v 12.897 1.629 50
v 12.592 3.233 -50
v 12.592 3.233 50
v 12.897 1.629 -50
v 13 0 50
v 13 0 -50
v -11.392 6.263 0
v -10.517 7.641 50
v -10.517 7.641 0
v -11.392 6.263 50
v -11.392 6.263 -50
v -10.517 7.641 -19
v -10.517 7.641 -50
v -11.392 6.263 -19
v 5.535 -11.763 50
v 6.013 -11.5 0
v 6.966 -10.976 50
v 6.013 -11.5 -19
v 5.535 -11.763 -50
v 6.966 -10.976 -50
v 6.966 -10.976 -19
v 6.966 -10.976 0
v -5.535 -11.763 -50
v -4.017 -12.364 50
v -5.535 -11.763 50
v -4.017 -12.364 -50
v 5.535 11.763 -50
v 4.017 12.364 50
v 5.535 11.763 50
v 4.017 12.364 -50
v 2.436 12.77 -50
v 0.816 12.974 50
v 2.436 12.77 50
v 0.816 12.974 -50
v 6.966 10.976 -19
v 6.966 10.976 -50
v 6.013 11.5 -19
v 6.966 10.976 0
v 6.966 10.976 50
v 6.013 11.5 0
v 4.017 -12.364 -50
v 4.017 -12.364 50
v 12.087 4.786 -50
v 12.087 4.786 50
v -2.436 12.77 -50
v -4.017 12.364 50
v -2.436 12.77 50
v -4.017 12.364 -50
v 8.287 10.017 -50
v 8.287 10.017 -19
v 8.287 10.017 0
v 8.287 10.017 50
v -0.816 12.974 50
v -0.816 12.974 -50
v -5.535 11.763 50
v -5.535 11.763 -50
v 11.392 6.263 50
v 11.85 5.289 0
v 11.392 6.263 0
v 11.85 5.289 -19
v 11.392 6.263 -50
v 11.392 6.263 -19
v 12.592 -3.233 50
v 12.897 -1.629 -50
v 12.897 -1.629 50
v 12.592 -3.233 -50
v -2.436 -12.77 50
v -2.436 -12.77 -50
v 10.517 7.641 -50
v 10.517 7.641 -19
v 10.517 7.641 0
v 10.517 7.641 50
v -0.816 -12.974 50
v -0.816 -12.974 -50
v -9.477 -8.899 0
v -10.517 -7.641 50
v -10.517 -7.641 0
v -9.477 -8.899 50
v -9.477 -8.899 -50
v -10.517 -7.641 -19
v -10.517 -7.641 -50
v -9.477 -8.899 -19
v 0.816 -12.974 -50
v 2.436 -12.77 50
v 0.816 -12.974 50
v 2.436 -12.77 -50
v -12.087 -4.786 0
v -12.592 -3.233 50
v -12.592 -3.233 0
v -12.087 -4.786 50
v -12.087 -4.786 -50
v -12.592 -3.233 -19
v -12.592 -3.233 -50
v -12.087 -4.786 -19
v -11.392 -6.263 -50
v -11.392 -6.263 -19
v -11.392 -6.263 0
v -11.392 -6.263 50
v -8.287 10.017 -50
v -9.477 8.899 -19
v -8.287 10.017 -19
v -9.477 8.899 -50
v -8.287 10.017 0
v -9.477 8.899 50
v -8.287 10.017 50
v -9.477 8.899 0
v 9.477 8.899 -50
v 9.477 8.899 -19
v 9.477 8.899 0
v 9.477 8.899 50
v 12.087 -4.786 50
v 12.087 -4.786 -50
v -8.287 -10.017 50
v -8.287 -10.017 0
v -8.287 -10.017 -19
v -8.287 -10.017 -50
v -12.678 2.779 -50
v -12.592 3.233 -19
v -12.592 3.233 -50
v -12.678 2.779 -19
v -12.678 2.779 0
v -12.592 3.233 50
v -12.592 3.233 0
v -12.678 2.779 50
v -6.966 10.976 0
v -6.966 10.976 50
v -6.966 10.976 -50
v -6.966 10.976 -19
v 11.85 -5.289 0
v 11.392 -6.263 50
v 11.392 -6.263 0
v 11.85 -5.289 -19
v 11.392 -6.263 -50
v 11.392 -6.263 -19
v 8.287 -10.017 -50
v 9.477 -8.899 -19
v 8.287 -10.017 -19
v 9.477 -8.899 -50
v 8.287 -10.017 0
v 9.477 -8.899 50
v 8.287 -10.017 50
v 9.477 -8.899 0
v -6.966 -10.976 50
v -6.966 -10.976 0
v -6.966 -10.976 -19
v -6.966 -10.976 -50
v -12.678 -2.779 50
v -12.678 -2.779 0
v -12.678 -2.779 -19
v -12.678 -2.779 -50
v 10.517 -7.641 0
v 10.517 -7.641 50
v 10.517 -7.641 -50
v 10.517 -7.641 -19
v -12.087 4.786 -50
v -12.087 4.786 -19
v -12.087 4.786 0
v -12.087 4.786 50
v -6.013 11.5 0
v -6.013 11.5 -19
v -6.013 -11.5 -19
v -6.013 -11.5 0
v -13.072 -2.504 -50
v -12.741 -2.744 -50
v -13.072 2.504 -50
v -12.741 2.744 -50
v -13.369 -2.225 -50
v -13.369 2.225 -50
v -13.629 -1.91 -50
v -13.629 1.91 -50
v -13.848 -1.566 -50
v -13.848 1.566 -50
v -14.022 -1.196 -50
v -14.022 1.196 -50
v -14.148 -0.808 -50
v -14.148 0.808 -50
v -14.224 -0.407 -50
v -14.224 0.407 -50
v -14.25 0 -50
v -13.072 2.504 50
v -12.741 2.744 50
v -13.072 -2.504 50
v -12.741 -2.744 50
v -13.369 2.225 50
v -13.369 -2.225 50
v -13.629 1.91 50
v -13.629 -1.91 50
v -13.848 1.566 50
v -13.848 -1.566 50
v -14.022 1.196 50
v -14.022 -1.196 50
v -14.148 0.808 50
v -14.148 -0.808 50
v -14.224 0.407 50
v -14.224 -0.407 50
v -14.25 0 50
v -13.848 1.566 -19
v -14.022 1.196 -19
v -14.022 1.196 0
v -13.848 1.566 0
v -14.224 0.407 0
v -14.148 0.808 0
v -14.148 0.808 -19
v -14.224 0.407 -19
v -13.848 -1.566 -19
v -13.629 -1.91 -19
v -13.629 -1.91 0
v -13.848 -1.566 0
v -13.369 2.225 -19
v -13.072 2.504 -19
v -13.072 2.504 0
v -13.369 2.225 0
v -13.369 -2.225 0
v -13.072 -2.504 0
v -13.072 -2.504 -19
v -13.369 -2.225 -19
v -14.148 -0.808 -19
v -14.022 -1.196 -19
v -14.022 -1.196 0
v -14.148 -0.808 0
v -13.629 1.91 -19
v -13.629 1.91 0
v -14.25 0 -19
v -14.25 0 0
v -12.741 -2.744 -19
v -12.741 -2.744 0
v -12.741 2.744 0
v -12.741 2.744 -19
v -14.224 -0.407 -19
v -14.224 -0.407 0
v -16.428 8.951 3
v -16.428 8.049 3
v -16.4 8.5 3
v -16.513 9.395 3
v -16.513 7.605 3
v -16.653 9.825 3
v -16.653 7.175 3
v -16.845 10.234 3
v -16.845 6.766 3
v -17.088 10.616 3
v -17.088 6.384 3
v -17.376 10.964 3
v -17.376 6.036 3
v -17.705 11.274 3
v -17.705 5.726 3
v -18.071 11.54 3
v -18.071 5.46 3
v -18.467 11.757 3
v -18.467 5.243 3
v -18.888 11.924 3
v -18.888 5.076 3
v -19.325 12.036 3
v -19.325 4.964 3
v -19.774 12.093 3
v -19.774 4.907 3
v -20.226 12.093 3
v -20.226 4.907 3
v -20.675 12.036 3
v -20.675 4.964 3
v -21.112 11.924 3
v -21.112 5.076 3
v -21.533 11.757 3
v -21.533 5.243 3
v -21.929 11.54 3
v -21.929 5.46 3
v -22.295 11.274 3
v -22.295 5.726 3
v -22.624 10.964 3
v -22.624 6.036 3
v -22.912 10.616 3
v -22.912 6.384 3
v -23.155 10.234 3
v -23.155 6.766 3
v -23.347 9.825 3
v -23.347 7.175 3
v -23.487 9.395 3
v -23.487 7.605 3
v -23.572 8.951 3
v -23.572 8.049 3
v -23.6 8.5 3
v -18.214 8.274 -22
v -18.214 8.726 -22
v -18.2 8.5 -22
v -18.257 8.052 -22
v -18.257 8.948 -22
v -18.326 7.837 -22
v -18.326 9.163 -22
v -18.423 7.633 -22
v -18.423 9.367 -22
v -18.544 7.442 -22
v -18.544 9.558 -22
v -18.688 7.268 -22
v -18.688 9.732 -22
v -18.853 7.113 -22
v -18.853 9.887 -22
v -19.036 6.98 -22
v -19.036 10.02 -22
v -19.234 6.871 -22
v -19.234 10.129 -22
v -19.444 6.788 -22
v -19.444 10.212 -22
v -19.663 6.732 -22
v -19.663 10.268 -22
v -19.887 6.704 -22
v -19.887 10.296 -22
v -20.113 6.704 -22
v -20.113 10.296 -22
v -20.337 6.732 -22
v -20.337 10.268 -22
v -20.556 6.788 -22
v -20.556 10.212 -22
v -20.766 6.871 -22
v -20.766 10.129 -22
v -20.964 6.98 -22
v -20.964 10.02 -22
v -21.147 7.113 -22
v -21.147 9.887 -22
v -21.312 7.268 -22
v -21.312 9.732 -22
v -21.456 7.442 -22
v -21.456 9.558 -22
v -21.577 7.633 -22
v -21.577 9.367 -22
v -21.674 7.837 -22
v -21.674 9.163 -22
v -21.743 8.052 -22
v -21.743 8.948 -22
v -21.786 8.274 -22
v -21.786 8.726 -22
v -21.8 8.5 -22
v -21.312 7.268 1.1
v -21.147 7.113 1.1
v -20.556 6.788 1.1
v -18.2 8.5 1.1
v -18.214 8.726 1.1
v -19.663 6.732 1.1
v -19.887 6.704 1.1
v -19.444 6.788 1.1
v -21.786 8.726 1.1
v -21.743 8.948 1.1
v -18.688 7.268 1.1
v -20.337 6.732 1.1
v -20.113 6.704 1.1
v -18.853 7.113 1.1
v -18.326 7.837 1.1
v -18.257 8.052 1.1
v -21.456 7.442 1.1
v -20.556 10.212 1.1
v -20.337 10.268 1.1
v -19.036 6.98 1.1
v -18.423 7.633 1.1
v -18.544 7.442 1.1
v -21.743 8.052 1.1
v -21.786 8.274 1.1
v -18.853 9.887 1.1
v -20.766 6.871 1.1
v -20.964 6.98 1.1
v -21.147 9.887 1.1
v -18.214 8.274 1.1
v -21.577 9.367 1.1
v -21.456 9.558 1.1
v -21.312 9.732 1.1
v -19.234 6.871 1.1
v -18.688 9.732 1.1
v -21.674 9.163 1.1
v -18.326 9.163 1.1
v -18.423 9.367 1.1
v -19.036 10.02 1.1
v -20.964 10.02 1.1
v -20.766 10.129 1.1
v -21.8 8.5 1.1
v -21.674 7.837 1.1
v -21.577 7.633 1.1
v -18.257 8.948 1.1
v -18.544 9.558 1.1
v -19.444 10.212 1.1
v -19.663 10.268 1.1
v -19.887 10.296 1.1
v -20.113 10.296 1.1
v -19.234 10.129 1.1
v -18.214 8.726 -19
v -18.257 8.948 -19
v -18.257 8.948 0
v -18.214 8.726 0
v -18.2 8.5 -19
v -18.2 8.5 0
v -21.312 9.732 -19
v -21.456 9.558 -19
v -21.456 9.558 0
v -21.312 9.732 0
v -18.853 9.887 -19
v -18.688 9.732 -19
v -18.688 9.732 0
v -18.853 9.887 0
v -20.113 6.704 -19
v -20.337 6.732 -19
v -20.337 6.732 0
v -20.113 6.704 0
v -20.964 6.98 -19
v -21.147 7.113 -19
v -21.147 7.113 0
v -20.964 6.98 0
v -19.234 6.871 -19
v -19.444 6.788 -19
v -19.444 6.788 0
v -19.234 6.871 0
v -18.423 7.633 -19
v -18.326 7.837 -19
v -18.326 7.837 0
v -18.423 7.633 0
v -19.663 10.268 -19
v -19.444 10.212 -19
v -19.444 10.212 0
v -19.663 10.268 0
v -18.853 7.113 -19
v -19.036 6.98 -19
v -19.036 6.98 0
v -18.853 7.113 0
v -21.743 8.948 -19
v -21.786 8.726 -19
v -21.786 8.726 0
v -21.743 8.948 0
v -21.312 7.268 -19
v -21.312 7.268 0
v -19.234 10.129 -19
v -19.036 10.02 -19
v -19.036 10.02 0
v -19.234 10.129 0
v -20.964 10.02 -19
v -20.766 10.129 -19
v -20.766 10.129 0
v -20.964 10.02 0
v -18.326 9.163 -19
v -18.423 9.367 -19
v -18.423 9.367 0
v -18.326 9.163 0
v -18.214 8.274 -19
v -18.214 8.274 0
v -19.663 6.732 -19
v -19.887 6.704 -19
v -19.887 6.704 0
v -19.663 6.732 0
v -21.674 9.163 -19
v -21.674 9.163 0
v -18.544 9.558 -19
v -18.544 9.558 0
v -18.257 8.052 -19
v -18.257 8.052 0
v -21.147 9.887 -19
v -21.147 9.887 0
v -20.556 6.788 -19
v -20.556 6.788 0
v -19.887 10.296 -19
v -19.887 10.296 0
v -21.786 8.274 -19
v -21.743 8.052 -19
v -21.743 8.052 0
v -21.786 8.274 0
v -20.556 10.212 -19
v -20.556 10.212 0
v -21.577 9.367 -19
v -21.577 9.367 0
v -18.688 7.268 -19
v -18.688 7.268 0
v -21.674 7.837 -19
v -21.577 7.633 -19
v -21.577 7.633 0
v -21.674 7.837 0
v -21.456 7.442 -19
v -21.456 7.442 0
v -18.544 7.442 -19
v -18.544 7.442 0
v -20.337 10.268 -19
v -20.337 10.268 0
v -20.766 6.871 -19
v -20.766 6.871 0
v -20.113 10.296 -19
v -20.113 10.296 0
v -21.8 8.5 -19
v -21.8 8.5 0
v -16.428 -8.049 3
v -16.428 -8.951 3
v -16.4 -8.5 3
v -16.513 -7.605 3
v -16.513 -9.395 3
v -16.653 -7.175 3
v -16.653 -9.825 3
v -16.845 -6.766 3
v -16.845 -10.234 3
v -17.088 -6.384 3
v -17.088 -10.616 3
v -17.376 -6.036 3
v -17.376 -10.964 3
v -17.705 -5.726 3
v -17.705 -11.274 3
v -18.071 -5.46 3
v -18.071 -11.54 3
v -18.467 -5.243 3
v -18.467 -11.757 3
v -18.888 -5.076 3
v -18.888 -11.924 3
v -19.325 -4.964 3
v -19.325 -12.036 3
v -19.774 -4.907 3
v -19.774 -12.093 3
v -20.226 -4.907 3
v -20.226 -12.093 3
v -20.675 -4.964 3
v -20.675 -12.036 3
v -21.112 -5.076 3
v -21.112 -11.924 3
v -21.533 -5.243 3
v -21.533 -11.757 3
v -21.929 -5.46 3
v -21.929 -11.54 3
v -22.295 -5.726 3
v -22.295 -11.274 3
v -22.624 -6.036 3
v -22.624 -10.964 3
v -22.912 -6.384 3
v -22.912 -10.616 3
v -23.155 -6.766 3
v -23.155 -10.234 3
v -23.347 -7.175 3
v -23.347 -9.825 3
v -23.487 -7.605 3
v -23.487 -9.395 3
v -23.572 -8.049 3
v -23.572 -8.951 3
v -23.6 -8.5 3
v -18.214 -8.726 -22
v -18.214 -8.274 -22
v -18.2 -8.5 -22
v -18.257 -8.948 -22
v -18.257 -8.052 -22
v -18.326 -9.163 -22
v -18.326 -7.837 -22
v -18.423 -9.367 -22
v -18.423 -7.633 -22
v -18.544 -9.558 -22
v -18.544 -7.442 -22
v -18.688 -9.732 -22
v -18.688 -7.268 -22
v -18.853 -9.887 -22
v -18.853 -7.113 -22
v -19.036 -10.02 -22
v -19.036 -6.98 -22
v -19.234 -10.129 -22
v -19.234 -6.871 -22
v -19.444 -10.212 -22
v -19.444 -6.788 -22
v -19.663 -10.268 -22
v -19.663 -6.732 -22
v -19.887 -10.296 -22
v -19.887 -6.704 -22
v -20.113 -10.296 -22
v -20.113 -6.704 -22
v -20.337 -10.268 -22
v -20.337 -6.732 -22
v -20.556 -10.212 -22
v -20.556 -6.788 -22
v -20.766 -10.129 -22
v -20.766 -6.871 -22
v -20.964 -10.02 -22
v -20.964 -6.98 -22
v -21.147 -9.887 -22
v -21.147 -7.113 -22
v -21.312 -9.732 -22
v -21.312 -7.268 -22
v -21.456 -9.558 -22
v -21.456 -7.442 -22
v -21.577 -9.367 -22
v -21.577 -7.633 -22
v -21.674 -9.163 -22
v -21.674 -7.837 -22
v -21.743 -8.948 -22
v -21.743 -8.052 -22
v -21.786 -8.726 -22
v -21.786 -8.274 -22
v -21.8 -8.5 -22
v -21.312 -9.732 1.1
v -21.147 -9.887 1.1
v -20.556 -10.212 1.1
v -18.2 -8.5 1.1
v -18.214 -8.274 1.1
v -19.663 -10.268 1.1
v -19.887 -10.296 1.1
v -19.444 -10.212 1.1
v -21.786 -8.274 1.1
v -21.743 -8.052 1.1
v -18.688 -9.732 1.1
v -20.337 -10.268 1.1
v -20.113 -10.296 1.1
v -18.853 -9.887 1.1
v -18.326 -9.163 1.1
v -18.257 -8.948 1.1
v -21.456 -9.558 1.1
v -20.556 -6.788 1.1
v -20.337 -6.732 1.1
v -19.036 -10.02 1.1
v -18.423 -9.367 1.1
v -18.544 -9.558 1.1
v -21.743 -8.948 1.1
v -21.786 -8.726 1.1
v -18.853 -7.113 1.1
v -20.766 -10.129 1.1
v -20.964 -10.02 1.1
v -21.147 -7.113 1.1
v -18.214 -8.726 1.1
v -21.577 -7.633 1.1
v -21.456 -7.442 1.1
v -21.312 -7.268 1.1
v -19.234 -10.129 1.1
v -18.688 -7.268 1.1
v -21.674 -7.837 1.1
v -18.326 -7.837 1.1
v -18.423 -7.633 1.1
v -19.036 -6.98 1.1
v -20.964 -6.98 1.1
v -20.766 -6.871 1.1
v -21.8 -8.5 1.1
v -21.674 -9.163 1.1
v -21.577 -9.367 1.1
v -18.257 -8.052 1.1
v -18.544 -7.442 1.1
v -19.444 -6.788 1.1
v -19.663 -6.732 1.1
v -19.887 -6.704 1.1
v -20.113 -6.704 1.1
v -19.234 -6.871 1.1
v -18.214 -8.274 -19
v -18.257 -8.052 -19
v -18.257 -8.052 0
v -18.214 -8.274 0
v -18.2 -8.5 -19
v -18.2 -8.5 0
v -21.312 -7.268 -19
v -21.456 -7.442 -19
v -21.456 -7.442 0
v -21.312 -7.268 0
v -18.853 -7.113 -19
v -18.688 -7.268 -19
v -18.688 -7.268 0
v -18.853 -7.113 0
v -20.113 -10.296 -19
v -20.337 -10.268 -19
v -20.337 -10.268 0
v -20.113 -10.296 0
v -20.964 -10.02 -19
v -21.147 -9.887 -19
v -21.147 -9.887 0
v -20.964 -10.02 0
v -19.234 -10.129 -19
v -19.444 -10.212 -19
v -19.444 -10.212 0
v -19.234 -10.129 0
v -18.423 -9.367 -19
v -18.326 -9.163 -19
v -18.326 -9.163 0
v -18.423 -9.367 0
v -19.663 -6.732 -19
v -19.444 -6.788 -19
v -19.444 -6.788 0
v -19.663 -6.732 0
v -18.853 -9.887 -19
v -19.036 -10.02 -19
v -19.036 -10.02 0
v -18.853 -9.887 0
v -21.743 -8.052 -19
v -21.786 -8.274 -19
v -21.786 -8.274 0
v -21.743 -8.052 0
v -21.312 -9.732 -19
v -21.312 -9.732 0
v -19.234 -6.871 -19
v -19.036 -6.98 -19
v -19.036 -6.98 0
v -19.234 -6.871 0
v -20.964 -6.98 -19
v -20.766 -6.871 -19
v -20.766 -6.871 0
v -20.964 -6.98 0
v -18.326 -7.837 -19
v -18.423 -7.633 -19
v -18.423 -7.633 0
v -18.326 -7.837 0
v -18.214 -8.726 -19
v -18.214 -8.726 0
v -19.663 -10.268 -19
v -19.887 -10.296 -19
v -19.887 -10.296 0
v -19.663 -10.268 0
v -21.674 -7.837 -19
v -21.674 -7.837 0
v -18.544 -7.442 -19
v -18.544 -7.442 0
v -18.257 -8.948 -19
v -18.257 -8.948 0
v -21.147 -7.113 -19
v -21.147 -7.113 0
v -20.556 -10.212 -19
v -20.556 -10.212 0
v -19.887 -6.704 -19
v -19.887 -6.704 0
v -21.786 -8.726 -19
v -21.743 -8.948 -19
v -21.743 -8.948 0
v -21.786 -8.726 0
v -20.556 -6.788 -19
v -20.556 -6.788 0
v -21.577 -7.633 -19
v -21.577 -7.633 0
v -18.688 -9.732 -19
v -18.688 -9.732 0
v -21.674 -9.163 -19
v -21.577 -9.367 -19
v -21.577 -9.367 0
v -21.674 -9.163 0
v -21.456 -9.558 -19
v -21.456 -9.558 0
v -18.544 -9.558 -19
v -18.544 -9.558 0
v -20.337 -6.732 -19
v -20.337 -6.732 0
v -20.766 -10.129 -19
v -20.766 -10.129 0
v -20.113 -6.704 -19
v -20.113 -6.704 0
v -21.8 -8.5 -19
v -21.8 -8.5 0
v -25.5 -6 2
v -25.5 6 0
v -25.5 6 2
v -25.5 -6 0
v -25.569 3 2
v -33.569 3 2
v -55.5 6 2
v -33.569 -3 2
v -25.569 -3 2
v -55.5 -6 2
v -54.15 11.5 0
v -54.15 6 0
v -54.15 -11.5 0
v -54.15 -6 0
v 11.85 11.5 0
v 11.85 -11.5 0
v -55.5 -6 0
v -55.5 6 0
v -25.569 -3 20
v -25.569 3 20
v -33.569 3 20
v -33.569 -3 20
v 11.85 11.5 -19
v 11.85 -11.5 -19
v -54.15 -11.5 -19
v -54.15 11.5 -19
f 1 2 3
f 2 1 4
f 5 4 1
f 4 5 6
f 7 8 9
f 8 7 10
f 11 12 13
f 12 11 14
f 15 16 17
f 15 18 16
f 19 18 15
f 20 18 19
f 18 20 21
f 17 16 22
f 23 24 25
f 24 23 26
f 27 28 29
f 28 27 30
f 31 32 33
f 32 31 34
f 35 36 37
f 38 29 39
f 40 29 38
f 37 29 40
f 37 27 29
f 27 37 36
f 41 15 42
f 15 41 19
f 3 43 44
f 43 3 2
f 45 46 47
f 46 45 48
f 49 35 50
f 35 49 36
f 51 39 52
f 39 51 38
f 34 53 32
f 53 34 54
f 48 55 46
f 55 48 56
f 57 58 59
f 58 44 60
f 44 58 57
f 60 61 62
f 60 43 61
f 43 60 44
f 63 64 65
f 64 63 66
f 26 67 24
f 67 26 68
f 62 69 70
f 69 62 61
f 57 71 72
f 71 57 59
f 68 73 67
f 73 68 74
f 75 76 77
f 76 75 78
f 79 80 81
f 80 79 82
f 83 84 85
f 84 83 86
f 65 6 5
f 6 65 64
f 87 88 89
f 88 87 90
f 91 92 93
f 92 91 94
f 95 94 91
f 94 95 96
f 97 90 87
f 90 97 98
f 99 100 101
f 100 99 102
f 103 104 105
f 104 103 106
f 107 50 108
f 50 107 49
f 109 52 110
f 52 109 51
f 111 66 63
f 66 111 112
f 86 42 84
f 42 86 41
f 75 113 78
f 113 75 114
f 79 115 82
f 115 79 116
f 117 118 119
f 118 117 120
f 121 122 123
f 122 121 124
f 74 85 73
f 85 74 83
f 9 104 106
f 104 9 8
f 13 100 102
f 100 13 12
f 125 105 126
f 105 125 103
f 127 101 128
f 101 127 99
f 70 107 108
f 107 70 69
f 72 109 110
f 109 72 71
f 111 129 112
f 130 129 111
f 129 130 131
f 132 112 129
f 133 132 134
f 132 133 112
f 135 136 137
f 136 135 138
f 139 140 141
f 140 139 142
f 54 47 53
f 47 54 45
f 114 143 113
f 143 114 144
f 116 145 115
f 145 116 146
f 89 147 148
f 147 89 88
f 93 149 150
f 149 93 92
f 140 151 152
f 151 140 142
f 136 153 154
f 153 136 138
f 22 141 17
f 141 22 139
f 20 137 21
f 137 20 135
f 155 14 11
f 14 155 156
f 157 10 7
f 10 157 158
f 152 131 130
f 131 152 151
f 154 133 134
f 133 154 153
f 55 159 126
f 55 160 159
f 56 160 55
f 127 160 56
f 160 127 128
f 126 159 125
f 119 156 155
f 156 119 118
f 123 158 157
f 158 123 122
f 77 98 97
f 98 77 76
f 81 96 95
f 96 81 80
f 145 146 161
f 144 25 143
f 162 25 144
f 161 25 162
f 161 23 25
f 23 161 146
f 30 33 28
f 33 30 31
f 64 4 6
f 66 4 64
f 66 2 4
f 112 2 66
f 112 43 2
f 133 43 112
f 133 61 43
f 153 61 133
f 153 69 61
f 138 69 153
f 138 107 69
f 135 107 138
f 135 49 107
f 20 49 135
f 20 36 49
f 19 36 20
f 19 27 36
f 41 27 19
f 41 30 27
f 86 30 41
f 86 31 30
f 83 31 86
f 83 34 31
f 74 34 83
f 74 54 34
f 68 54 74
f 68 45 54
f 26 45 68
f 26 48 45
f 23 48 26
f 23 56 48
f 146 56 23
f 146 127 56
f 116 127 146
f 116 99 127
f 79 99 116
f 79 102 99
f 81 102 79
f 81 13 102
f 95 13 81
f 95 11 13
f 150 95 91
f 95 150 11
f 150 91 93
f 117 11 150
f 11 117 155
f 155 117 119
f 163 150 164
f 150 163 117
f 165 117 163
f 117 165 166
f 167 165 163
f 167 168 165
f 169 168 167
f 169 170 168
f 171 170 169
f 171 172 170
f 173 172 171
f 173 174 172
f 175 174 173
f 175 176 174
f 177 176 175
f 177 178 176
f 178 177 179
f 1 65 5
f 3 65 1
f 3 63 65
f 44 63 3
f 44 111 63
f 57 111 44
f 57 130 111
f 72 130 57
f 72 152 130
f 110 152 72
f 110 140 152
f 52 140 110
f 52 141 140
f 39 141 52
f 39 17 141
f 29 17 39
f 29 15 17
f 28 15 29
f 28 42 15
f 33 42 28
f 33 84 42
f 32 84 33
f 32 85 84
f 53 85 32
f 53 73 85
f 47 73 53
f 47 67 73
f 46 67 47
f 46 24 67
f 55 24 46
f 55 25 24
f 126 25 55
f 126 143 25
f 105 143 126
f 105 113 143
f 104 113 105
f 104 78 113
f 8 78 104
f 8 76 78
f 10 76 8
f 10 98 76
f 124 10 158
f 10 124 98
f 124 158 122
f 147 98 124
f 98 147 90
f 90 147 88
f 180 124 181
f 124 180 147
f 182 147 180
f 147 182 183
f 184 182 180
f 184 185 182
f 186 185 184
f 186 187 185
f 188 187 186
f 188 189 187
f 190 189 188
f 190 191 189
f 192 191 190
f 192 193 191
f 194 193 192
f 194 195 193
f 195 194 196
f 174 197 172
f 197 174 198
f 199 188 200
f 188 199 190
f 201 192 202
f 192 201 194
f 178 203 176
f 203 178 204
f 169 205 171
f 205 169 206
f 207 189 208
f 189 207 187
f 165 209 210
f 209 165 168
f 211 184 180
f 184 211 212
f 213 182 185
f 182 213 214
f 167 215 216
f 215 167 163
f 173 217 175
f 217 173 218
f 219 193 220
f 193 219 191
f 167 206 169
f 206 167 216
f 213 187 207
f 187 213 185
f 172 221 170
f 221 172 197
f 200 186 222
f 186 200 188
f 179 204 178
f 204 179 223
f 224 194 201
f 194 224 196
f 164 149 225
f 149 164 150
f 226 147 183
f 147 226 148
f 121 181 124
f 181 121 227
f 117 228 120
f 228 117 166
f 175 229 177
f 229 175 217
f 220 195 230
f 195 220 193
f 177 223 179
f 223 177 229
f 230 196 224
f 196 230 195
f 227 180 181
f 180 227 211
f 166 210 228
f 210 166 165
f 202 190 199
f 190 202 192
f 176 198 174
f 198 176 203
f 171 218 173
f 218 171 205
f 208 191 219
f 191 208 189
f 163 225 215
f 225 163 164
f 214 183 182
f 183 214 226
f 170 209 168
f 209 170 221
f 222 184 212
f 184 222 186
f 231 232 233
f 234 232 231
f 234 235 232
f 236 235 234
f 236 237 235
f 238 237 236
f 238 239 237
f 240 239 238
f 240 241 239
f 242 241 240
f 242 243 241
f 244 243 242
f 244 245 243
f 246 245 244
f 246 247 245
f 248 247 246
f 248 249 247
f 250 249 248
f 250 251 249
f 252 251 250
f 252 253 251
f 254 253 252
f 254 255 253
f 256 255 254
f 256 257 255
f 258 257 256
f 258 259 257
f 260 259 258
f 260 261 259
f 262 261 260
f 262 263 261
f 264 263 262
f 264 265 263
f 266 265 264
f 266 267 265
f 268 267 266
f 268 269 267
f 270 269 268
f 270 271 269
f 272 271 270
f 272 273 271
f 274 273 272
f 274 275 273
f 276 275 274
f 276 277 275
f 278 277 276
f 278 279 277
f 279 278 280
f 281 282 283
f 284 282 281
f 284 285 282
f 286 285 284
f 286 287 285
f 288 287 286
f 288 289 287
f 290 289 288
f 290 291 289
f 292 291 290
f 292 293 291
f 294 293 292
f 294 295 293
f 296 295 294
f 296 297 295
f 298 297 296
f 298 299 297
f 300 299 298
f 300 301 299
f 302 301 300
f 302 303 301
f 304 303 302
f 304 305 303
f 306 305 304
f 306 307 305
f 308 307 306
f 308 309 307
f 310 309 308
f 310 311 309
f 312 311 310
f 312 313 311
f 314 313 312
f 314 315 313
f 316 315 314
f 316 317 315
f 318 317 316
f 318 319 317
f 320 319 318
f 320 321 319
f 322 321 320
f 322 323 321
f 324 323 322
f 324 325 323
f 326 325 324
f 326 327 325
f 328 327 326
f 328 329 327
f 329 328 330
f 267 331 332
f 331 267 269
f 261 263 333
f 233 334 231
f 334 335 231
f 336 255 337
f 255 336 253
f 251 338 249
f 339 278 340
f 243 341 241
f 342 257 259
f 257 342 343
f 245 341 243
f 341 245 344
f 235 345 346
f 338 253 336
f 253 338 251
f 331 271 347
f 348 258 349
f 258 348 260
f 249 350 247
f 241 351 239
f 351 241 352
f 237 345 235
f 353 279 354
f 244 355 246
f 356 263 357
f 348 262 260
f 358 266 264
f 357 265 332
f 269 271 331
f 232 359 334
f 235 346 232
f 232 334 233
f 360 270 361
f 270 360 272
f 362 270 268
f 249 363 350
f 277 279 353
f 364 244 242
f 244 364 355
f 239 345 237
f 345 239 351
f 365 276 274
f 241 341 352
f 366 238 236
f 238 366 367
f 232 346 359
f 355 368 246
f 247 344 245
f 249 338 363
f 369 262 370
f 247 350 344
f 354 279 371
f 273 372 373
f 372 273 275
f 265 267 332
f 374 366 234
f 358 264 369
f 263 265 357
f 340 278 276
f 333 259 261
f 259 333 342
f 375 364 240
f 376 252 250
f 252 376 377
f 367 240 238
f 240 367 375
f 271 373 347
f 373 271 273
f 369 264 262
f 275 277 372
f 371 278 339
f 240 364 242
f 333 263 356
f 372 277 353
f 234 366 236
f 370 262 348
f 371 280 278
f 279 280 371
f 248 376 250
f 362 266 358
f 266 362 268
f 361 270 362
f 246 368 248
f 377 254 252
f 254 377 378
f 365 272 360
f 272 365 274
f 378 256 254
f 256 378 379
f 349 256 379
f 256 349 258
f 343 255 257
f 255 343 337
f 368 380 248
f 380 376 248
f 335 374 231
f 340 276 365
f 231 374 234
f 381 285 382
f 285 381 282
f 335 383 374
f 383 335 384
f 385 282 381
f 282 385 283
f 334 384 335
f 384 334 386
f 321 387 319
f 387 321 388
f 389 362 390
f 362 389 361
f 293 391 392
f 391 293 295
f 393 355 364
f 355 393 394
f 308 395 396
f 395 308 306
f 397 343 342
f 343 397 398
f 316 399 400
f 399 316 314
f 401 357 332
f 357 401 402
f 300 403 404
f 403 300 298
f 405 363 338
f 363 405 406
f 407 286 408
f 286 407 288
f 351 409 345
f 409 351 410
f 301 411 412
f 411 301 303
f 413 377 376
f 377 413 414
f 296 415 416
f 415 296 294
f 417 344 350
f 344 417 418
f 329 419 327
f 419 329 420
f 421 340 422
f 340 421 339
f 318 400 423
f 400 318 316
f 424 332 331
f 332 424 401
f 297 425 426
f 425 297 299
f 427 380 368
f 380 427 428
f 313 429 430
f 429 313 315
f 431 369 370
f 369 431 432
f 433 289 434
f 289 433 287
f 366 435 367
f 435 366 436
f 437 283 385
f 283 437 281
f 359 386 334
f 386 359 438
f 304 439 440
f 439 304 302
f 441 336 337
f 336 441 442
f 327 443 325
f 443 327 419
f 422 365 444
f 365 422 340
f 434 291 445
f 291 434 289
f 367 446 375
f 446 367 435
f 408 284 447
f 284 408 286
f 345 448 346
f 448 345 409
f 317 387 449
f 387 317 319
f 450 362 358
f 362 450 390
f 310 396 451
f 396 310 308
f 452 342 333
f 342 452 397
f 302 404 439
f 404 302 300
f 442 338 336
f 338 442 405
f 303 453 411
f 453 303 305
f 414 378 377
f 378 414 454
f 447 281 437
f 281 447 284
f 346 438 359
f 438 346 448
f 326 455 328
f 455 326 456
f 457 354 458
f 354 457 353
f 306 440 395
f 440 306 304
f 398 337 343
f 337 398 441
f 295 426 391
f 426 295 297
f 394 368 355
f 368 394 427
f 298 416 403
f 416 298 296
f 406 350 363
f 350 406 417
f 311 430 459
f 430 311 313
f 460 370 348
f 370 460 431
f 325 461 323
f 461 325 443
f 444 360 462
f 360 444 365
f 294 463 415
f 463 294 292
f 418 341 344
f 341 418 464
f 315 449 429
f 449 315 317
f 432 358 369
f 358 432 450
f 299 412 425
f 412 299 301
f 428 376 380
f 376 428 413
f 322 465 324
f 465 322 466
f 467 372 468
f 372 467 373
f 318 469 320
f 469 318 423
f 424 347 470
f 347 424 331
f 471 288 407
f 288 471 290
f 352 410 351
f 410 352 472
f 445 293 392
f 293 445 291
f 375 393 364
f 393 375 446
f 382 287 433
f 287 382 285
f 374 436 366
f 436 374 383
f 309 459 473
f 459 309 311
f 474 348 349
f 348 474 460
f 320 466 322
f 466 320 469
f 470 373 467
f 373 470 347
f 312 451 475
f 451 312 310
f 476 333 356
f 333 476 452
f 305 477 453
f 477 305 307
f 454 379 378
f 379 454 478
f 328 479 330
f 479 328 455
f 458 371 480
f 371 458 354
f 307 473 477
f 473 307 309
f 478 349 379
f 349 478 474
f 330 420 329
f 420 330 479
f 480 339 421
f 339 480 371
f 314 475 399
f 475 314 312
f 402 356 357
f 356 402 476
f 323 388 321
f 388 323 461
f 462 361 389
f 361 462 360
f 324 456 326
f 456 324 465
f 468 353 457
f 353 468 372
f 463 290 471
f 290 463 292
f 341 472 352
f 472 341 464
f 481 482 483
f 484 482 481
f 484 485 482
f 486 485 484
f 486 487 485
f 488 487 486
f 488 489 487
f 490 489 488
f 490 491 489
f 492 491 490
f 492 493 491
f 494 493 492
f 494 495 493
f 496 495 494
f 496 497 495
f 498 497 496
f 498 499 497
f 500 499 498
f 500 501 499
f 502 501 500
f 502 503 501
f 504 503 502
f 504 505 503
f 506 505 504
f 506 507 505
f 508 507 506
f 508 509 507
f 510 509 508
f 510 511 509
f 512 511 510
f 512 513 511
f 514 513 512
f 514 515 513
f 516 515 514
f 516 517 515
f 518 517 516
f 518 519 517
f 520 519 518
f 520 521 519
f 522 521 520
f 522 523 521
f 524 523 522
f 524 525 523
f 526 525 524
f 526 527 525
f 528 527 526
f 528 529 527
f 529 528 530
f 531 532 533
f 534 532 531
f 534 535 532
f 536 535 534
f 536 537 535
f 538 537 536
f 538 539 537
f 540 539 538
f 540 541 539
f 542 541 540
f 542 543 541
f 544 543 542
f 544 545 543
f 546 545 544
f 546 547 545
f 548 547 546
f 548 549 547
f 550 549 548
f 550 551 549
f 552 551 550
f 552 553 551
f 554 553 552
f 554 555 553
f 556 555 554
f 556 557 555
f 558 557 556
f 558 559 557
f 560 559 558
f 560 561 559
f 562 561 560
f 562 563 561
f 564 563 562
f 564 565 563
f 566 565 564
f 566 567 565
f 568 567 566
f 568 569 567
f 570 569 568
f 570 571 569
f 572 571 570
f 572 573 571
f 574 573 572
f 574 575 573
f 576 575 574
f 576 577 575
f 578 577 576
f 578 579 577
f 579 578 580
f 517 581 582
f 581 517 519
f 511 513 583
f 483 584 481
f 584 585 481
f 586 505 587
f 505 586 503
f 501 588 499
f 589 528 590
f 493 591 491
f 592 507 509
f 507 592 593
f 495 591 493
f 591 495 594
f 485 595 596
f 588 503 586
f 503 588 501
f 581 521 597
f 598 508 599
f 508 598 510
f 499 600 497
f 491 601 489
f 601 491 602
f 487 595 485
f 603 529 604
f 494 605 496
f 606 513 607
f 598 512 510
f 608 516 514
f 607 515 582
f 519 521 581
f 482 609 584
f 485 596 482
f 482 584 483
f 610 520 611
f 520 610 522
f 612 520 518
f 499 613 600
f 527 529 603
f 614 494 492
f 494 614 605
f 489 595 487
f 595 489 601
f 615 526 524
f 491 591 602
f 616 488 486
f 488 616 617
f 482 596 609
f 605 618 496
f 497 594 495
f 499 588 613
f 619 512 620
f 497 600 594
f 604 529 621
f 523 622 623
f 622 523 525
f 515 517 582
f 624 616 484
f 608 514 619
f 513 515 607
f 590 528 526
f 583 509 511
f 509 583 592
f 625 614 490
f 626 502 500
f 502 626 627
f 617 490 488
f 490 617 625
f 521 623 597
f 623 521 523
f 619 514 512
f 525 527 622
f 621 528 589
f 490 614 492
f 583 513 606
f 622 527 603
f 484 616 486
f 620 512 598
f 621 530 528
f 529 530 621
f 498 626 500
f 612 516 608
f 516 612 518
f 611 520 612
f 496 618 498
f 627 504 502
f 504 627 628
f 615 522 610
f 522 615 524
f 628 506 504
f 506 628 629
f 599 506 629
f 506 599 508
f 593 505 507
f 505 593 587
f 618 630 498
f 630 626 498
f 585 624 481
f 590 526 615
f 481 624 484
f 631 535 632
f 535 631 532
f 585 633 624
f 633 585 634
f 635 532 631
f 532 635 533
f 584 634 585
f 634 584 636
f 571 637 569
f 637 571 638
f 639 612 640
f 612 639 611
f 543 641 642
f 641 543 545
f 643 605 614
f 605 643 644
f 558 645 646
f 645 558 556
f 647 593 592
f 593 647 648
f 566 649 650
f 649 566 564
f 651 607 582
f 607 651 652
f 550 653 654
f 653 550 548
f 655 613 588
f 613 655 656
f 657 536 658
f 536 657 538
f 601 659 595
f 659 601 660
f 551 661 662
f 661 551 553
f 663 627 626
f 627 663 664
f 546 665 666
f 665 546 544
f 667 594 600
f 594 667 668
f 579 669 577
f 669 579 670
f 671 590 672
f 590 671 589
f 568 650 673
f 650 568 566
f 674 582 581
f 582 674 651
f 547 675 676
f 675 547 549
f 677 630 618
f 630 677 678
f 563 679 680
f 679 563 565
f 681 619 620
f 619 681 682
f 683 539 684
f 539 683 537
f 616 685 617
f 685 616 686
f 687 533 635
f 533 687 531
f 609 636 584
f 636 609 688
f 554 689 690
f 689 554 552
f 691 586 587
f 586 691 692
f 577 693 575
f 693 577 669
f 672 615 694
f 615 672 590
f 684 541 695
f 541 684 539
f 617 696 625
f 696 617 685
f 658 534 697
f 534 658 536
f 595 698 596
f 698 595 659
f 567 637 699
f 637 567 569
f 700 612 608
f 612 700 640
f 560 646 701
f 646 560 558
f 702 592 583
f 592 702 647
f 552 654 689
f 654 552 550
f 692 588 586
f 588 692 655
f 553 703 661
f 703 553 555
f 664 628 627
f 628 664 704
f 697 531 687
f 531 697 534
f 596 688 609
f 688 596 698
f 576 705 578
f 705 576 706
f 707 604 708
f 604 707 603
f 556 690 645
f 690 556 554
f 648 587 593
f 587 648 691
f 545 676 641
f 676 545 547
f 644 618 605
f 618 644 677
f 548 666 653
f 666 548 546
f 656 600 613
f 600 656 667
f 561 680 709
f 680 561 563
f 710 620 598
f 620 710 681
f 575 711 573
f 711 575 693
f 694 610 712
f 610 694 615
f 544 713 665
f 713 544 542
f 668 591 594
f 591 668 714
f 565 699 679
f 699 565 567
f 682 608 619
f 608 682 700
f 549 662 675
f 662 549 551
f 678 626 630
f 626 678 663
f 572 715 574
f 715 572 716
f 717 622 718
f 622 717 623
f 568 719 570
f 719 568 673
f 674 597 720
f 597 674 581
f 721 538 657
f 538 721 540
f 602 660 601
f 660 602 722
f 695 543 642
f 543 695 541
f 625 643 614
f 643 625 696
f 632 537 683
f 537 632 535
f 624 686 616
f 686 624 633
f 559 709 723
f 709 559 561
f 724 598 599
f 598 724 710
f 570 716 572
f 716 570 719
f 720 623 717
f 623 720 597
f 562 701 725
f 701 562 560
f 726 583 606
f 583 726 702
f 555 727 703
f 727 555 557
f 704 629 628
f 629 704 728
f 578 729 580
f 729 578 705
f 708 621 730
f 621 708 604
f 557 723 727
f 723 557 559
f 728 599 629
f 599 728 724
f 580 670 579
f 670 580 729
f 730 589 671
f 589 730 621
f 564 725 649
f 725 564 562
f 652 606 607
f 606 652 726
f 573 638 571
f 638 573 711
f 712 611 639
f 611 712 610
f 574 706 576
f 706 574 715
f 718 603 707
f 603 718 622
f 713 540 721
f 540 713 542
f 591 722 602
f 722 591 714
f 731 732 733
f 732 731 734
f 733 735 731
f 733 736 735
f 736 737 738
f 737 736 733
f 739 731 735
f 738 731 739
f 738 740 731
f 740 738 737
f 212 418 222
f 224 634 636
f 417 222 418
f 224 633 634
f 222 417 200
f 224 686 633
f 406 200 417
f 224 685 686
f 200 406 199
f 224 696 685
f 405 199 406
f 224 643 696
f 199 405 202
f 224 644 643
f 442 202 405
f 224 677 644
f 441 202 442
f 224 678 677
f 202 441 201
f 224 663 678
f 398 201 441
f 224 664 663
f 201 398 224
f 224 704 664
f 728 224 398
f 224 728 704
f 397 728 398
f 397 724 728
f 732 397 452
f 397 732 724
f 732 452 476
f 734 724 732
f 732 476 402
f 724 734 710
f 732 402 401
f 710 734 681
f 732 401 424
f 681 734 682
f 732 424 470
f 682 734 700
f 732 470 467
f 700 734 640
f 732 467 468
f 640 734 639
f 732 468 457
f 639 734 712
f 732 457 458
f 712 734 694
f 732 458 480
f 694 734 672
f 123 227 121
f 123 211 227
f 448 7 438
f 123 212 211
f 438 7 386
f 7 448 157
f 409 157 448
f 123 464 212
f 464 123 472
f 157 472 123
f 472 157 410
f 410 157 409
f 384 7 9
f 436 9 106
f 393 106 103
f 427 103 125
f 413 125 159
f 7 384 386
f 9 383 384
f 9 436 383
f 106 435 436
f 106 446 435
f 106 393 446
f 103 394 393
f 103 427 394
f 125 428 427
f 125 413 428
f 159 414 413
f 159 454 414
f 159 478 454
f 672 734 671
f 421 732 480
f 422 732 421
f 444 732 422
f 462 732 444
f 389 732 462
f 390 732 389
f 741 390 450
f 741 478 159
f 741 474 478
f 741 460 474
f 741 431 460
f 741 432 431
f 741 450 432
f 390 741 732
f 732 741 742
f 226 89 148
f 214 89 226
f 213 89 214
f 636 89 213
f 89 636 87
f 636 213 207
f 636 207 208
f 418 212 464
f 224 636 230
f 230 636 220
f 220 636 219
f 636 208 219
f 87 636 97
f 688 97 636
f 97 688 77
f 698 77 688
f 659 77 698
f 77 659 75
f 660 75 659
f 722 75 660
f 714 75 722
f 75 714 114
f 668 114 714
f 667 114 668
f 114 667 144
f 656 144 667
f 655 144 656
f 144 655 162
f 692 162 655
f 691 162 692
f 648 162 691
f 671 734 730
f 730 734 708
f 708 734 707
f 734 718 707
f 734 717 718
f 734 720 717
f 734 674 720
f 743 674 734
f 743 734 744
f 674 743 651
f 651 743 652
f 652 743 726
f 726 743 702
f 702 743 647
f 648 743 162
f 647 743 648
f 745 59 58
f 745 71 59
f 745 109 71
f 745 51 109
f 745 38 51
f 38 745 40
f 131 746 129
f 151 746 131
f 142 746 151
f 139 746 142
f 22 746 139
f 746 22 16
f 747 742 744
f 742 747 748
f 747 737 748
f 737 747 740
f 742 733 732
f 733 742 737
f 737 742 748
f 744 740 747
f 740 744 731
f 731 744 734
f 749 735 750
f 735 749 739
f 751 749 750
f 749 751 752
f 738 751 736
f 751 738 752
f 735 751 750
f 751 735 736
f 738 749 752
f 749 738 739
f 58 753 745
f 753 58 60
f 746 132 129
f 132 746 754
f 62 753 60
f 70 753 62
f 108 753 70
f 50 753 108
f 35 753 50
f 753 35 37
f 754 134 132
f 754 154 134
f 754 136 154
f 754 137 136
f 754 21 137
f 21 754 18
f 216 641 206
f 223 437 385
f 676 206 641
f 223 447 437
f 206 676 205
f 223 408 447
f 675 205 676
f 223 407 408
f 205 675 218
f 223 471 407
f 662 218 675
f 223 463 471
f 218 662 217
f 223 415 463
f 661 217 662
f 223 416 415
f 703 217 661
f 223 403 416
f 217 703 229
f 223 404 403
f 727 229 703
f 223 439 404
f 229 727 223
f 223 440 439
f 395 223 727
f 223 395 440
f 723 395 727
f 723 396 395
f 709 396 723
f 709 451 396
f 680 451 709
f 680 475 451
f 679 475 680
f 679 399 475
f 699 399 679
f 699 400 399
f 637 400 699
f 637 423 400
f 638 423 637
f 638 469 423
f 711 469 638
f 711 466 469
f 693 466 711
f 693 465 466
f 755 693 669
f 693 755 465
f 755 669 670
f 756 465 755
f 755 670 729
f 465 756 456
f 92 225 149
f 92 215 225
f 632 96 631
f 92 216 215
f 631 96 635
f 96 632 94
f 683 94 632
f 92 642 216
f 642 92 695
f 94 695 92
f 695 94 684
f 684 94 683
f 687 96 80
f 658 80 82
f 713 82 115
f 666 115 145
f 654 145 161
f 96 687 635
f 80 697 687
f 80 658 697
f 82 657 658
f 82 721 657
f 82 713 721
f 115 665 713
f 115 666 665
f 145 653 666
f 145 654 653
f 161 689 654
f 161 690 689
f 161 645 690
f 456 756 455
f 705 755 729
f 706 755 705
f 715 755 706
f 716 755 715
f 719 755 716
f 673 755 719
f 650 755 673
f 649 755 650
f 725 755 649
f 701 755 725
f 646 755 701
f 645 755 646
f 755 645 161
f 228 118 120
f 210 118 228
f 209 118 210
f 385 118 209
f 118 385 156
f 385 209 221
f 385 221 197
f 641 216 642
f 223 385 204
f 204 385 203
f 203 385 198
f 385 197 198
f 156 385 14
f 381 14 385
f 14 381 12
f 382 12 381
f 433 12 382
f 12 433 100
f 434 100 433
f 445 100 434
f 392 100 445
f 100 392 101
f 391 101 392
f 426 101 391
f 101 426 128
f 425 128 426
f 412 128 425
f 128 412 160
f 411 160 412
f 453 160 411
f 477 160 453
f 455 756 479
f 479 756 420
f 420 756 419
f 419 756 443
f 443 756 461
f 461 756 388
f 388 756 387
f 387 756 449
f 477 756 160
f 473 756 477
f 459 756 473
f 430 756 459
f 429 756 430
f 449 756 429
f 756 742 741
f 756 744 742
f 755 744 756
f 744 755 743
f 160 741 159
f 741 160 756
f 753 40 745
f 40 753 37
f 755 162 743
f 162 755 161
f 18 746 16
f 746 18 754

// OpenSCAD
$fn = 50;


difference() {
	union() {
		translate(v = [0, 0, 0]) {
			rotate(a = [0, 0, 0]) {
				difference() {
					union() {
						translate(v = [0, 0, 0]) {
							rotate(a = [0, 0, 0]) {
								difference() {
									union() {
										translate(v = [0, 0, -50.0000000000]) {
											cylinder(h = 100, r = 13.0000000000);
										}
									}
									union();
								}
							}
						}
						translate(v = [-11, 0, 0]) {
							rotate(a = [0, 0, 0]) {
								difference() {
									union() {
										translate(v = [0, 0, -50.0000000000]) {
											cylinder(h = 100, r = 3.2500000000);
										}
									}
									union();
								}
							}
						}
						translate(v = [-20, 8.5000000000, 3]) {
							rotate(a = [0, 0, 0]) {
								difference() {
									union() {
										translate(v = [0, 0, -25.0000000000]) {
											cylinder(h = 25, r = 1.5000000000);
										}
										translate(v = [0, 0, -1.9000000000]) {
											cylinder(h = 1.9000000000, r1 = 1.8000000000, r2 = 3.6000000000);
										}
										translate(v = [0, 0, -25.0000000000]) {
											cylinder(h = 25, r = 1.8000000000);
										}
										translate(v = [0, 0, -25.0000000000]) {
											cylinder(h = 25, r = 1.5000000000);
										}
									}
									union();
								}
							}
						}
						translate(v = [-20, -8.5000000000, 3]) {
							rotate(a = [0, 0, 0]) {
								difference() {
									union() {
										translate(v = [0, 0, -25.0000000000]) {
											cylinder(h = 25, r = 1.5000000000);
										}
										translate(v = [0, 0, -1.9000000000]) {
											cylinder(h = 1.9000000000, r1 = 1.8000000000, r2 = 3.6000000000);
										}
										translate(v = [0, 0, -25.0000000000]) {
											cylinder(h = 25, r = 1.8000000000);
										}
										translate(v = [0, 0, -25.0000000000]) {
											cylinder(h = 25, r = 1.5000000000);
										}
									}
									union();
								}
							}
						}
						translate(v = [-55.5000000000, -6.0000000000, 0]) {
							cube(size = [30, 12, 2]);
						}
						translate(v = [-54.0000000000, -4.0000000000, 0]) {
							cube(size = [18, 8, 2]);
						}
						translate(v = [-33.5690000000, -3.0000000000, 0]) {
							cube(size = [8, 6, 20]);
						}
						translate(v = [-54.1500000000, -11.5000000000, -19]) {
							cube(size = [66, 23, 19]);
						}
					}
					union();
				}
			}
		}
	}
	union();
}
